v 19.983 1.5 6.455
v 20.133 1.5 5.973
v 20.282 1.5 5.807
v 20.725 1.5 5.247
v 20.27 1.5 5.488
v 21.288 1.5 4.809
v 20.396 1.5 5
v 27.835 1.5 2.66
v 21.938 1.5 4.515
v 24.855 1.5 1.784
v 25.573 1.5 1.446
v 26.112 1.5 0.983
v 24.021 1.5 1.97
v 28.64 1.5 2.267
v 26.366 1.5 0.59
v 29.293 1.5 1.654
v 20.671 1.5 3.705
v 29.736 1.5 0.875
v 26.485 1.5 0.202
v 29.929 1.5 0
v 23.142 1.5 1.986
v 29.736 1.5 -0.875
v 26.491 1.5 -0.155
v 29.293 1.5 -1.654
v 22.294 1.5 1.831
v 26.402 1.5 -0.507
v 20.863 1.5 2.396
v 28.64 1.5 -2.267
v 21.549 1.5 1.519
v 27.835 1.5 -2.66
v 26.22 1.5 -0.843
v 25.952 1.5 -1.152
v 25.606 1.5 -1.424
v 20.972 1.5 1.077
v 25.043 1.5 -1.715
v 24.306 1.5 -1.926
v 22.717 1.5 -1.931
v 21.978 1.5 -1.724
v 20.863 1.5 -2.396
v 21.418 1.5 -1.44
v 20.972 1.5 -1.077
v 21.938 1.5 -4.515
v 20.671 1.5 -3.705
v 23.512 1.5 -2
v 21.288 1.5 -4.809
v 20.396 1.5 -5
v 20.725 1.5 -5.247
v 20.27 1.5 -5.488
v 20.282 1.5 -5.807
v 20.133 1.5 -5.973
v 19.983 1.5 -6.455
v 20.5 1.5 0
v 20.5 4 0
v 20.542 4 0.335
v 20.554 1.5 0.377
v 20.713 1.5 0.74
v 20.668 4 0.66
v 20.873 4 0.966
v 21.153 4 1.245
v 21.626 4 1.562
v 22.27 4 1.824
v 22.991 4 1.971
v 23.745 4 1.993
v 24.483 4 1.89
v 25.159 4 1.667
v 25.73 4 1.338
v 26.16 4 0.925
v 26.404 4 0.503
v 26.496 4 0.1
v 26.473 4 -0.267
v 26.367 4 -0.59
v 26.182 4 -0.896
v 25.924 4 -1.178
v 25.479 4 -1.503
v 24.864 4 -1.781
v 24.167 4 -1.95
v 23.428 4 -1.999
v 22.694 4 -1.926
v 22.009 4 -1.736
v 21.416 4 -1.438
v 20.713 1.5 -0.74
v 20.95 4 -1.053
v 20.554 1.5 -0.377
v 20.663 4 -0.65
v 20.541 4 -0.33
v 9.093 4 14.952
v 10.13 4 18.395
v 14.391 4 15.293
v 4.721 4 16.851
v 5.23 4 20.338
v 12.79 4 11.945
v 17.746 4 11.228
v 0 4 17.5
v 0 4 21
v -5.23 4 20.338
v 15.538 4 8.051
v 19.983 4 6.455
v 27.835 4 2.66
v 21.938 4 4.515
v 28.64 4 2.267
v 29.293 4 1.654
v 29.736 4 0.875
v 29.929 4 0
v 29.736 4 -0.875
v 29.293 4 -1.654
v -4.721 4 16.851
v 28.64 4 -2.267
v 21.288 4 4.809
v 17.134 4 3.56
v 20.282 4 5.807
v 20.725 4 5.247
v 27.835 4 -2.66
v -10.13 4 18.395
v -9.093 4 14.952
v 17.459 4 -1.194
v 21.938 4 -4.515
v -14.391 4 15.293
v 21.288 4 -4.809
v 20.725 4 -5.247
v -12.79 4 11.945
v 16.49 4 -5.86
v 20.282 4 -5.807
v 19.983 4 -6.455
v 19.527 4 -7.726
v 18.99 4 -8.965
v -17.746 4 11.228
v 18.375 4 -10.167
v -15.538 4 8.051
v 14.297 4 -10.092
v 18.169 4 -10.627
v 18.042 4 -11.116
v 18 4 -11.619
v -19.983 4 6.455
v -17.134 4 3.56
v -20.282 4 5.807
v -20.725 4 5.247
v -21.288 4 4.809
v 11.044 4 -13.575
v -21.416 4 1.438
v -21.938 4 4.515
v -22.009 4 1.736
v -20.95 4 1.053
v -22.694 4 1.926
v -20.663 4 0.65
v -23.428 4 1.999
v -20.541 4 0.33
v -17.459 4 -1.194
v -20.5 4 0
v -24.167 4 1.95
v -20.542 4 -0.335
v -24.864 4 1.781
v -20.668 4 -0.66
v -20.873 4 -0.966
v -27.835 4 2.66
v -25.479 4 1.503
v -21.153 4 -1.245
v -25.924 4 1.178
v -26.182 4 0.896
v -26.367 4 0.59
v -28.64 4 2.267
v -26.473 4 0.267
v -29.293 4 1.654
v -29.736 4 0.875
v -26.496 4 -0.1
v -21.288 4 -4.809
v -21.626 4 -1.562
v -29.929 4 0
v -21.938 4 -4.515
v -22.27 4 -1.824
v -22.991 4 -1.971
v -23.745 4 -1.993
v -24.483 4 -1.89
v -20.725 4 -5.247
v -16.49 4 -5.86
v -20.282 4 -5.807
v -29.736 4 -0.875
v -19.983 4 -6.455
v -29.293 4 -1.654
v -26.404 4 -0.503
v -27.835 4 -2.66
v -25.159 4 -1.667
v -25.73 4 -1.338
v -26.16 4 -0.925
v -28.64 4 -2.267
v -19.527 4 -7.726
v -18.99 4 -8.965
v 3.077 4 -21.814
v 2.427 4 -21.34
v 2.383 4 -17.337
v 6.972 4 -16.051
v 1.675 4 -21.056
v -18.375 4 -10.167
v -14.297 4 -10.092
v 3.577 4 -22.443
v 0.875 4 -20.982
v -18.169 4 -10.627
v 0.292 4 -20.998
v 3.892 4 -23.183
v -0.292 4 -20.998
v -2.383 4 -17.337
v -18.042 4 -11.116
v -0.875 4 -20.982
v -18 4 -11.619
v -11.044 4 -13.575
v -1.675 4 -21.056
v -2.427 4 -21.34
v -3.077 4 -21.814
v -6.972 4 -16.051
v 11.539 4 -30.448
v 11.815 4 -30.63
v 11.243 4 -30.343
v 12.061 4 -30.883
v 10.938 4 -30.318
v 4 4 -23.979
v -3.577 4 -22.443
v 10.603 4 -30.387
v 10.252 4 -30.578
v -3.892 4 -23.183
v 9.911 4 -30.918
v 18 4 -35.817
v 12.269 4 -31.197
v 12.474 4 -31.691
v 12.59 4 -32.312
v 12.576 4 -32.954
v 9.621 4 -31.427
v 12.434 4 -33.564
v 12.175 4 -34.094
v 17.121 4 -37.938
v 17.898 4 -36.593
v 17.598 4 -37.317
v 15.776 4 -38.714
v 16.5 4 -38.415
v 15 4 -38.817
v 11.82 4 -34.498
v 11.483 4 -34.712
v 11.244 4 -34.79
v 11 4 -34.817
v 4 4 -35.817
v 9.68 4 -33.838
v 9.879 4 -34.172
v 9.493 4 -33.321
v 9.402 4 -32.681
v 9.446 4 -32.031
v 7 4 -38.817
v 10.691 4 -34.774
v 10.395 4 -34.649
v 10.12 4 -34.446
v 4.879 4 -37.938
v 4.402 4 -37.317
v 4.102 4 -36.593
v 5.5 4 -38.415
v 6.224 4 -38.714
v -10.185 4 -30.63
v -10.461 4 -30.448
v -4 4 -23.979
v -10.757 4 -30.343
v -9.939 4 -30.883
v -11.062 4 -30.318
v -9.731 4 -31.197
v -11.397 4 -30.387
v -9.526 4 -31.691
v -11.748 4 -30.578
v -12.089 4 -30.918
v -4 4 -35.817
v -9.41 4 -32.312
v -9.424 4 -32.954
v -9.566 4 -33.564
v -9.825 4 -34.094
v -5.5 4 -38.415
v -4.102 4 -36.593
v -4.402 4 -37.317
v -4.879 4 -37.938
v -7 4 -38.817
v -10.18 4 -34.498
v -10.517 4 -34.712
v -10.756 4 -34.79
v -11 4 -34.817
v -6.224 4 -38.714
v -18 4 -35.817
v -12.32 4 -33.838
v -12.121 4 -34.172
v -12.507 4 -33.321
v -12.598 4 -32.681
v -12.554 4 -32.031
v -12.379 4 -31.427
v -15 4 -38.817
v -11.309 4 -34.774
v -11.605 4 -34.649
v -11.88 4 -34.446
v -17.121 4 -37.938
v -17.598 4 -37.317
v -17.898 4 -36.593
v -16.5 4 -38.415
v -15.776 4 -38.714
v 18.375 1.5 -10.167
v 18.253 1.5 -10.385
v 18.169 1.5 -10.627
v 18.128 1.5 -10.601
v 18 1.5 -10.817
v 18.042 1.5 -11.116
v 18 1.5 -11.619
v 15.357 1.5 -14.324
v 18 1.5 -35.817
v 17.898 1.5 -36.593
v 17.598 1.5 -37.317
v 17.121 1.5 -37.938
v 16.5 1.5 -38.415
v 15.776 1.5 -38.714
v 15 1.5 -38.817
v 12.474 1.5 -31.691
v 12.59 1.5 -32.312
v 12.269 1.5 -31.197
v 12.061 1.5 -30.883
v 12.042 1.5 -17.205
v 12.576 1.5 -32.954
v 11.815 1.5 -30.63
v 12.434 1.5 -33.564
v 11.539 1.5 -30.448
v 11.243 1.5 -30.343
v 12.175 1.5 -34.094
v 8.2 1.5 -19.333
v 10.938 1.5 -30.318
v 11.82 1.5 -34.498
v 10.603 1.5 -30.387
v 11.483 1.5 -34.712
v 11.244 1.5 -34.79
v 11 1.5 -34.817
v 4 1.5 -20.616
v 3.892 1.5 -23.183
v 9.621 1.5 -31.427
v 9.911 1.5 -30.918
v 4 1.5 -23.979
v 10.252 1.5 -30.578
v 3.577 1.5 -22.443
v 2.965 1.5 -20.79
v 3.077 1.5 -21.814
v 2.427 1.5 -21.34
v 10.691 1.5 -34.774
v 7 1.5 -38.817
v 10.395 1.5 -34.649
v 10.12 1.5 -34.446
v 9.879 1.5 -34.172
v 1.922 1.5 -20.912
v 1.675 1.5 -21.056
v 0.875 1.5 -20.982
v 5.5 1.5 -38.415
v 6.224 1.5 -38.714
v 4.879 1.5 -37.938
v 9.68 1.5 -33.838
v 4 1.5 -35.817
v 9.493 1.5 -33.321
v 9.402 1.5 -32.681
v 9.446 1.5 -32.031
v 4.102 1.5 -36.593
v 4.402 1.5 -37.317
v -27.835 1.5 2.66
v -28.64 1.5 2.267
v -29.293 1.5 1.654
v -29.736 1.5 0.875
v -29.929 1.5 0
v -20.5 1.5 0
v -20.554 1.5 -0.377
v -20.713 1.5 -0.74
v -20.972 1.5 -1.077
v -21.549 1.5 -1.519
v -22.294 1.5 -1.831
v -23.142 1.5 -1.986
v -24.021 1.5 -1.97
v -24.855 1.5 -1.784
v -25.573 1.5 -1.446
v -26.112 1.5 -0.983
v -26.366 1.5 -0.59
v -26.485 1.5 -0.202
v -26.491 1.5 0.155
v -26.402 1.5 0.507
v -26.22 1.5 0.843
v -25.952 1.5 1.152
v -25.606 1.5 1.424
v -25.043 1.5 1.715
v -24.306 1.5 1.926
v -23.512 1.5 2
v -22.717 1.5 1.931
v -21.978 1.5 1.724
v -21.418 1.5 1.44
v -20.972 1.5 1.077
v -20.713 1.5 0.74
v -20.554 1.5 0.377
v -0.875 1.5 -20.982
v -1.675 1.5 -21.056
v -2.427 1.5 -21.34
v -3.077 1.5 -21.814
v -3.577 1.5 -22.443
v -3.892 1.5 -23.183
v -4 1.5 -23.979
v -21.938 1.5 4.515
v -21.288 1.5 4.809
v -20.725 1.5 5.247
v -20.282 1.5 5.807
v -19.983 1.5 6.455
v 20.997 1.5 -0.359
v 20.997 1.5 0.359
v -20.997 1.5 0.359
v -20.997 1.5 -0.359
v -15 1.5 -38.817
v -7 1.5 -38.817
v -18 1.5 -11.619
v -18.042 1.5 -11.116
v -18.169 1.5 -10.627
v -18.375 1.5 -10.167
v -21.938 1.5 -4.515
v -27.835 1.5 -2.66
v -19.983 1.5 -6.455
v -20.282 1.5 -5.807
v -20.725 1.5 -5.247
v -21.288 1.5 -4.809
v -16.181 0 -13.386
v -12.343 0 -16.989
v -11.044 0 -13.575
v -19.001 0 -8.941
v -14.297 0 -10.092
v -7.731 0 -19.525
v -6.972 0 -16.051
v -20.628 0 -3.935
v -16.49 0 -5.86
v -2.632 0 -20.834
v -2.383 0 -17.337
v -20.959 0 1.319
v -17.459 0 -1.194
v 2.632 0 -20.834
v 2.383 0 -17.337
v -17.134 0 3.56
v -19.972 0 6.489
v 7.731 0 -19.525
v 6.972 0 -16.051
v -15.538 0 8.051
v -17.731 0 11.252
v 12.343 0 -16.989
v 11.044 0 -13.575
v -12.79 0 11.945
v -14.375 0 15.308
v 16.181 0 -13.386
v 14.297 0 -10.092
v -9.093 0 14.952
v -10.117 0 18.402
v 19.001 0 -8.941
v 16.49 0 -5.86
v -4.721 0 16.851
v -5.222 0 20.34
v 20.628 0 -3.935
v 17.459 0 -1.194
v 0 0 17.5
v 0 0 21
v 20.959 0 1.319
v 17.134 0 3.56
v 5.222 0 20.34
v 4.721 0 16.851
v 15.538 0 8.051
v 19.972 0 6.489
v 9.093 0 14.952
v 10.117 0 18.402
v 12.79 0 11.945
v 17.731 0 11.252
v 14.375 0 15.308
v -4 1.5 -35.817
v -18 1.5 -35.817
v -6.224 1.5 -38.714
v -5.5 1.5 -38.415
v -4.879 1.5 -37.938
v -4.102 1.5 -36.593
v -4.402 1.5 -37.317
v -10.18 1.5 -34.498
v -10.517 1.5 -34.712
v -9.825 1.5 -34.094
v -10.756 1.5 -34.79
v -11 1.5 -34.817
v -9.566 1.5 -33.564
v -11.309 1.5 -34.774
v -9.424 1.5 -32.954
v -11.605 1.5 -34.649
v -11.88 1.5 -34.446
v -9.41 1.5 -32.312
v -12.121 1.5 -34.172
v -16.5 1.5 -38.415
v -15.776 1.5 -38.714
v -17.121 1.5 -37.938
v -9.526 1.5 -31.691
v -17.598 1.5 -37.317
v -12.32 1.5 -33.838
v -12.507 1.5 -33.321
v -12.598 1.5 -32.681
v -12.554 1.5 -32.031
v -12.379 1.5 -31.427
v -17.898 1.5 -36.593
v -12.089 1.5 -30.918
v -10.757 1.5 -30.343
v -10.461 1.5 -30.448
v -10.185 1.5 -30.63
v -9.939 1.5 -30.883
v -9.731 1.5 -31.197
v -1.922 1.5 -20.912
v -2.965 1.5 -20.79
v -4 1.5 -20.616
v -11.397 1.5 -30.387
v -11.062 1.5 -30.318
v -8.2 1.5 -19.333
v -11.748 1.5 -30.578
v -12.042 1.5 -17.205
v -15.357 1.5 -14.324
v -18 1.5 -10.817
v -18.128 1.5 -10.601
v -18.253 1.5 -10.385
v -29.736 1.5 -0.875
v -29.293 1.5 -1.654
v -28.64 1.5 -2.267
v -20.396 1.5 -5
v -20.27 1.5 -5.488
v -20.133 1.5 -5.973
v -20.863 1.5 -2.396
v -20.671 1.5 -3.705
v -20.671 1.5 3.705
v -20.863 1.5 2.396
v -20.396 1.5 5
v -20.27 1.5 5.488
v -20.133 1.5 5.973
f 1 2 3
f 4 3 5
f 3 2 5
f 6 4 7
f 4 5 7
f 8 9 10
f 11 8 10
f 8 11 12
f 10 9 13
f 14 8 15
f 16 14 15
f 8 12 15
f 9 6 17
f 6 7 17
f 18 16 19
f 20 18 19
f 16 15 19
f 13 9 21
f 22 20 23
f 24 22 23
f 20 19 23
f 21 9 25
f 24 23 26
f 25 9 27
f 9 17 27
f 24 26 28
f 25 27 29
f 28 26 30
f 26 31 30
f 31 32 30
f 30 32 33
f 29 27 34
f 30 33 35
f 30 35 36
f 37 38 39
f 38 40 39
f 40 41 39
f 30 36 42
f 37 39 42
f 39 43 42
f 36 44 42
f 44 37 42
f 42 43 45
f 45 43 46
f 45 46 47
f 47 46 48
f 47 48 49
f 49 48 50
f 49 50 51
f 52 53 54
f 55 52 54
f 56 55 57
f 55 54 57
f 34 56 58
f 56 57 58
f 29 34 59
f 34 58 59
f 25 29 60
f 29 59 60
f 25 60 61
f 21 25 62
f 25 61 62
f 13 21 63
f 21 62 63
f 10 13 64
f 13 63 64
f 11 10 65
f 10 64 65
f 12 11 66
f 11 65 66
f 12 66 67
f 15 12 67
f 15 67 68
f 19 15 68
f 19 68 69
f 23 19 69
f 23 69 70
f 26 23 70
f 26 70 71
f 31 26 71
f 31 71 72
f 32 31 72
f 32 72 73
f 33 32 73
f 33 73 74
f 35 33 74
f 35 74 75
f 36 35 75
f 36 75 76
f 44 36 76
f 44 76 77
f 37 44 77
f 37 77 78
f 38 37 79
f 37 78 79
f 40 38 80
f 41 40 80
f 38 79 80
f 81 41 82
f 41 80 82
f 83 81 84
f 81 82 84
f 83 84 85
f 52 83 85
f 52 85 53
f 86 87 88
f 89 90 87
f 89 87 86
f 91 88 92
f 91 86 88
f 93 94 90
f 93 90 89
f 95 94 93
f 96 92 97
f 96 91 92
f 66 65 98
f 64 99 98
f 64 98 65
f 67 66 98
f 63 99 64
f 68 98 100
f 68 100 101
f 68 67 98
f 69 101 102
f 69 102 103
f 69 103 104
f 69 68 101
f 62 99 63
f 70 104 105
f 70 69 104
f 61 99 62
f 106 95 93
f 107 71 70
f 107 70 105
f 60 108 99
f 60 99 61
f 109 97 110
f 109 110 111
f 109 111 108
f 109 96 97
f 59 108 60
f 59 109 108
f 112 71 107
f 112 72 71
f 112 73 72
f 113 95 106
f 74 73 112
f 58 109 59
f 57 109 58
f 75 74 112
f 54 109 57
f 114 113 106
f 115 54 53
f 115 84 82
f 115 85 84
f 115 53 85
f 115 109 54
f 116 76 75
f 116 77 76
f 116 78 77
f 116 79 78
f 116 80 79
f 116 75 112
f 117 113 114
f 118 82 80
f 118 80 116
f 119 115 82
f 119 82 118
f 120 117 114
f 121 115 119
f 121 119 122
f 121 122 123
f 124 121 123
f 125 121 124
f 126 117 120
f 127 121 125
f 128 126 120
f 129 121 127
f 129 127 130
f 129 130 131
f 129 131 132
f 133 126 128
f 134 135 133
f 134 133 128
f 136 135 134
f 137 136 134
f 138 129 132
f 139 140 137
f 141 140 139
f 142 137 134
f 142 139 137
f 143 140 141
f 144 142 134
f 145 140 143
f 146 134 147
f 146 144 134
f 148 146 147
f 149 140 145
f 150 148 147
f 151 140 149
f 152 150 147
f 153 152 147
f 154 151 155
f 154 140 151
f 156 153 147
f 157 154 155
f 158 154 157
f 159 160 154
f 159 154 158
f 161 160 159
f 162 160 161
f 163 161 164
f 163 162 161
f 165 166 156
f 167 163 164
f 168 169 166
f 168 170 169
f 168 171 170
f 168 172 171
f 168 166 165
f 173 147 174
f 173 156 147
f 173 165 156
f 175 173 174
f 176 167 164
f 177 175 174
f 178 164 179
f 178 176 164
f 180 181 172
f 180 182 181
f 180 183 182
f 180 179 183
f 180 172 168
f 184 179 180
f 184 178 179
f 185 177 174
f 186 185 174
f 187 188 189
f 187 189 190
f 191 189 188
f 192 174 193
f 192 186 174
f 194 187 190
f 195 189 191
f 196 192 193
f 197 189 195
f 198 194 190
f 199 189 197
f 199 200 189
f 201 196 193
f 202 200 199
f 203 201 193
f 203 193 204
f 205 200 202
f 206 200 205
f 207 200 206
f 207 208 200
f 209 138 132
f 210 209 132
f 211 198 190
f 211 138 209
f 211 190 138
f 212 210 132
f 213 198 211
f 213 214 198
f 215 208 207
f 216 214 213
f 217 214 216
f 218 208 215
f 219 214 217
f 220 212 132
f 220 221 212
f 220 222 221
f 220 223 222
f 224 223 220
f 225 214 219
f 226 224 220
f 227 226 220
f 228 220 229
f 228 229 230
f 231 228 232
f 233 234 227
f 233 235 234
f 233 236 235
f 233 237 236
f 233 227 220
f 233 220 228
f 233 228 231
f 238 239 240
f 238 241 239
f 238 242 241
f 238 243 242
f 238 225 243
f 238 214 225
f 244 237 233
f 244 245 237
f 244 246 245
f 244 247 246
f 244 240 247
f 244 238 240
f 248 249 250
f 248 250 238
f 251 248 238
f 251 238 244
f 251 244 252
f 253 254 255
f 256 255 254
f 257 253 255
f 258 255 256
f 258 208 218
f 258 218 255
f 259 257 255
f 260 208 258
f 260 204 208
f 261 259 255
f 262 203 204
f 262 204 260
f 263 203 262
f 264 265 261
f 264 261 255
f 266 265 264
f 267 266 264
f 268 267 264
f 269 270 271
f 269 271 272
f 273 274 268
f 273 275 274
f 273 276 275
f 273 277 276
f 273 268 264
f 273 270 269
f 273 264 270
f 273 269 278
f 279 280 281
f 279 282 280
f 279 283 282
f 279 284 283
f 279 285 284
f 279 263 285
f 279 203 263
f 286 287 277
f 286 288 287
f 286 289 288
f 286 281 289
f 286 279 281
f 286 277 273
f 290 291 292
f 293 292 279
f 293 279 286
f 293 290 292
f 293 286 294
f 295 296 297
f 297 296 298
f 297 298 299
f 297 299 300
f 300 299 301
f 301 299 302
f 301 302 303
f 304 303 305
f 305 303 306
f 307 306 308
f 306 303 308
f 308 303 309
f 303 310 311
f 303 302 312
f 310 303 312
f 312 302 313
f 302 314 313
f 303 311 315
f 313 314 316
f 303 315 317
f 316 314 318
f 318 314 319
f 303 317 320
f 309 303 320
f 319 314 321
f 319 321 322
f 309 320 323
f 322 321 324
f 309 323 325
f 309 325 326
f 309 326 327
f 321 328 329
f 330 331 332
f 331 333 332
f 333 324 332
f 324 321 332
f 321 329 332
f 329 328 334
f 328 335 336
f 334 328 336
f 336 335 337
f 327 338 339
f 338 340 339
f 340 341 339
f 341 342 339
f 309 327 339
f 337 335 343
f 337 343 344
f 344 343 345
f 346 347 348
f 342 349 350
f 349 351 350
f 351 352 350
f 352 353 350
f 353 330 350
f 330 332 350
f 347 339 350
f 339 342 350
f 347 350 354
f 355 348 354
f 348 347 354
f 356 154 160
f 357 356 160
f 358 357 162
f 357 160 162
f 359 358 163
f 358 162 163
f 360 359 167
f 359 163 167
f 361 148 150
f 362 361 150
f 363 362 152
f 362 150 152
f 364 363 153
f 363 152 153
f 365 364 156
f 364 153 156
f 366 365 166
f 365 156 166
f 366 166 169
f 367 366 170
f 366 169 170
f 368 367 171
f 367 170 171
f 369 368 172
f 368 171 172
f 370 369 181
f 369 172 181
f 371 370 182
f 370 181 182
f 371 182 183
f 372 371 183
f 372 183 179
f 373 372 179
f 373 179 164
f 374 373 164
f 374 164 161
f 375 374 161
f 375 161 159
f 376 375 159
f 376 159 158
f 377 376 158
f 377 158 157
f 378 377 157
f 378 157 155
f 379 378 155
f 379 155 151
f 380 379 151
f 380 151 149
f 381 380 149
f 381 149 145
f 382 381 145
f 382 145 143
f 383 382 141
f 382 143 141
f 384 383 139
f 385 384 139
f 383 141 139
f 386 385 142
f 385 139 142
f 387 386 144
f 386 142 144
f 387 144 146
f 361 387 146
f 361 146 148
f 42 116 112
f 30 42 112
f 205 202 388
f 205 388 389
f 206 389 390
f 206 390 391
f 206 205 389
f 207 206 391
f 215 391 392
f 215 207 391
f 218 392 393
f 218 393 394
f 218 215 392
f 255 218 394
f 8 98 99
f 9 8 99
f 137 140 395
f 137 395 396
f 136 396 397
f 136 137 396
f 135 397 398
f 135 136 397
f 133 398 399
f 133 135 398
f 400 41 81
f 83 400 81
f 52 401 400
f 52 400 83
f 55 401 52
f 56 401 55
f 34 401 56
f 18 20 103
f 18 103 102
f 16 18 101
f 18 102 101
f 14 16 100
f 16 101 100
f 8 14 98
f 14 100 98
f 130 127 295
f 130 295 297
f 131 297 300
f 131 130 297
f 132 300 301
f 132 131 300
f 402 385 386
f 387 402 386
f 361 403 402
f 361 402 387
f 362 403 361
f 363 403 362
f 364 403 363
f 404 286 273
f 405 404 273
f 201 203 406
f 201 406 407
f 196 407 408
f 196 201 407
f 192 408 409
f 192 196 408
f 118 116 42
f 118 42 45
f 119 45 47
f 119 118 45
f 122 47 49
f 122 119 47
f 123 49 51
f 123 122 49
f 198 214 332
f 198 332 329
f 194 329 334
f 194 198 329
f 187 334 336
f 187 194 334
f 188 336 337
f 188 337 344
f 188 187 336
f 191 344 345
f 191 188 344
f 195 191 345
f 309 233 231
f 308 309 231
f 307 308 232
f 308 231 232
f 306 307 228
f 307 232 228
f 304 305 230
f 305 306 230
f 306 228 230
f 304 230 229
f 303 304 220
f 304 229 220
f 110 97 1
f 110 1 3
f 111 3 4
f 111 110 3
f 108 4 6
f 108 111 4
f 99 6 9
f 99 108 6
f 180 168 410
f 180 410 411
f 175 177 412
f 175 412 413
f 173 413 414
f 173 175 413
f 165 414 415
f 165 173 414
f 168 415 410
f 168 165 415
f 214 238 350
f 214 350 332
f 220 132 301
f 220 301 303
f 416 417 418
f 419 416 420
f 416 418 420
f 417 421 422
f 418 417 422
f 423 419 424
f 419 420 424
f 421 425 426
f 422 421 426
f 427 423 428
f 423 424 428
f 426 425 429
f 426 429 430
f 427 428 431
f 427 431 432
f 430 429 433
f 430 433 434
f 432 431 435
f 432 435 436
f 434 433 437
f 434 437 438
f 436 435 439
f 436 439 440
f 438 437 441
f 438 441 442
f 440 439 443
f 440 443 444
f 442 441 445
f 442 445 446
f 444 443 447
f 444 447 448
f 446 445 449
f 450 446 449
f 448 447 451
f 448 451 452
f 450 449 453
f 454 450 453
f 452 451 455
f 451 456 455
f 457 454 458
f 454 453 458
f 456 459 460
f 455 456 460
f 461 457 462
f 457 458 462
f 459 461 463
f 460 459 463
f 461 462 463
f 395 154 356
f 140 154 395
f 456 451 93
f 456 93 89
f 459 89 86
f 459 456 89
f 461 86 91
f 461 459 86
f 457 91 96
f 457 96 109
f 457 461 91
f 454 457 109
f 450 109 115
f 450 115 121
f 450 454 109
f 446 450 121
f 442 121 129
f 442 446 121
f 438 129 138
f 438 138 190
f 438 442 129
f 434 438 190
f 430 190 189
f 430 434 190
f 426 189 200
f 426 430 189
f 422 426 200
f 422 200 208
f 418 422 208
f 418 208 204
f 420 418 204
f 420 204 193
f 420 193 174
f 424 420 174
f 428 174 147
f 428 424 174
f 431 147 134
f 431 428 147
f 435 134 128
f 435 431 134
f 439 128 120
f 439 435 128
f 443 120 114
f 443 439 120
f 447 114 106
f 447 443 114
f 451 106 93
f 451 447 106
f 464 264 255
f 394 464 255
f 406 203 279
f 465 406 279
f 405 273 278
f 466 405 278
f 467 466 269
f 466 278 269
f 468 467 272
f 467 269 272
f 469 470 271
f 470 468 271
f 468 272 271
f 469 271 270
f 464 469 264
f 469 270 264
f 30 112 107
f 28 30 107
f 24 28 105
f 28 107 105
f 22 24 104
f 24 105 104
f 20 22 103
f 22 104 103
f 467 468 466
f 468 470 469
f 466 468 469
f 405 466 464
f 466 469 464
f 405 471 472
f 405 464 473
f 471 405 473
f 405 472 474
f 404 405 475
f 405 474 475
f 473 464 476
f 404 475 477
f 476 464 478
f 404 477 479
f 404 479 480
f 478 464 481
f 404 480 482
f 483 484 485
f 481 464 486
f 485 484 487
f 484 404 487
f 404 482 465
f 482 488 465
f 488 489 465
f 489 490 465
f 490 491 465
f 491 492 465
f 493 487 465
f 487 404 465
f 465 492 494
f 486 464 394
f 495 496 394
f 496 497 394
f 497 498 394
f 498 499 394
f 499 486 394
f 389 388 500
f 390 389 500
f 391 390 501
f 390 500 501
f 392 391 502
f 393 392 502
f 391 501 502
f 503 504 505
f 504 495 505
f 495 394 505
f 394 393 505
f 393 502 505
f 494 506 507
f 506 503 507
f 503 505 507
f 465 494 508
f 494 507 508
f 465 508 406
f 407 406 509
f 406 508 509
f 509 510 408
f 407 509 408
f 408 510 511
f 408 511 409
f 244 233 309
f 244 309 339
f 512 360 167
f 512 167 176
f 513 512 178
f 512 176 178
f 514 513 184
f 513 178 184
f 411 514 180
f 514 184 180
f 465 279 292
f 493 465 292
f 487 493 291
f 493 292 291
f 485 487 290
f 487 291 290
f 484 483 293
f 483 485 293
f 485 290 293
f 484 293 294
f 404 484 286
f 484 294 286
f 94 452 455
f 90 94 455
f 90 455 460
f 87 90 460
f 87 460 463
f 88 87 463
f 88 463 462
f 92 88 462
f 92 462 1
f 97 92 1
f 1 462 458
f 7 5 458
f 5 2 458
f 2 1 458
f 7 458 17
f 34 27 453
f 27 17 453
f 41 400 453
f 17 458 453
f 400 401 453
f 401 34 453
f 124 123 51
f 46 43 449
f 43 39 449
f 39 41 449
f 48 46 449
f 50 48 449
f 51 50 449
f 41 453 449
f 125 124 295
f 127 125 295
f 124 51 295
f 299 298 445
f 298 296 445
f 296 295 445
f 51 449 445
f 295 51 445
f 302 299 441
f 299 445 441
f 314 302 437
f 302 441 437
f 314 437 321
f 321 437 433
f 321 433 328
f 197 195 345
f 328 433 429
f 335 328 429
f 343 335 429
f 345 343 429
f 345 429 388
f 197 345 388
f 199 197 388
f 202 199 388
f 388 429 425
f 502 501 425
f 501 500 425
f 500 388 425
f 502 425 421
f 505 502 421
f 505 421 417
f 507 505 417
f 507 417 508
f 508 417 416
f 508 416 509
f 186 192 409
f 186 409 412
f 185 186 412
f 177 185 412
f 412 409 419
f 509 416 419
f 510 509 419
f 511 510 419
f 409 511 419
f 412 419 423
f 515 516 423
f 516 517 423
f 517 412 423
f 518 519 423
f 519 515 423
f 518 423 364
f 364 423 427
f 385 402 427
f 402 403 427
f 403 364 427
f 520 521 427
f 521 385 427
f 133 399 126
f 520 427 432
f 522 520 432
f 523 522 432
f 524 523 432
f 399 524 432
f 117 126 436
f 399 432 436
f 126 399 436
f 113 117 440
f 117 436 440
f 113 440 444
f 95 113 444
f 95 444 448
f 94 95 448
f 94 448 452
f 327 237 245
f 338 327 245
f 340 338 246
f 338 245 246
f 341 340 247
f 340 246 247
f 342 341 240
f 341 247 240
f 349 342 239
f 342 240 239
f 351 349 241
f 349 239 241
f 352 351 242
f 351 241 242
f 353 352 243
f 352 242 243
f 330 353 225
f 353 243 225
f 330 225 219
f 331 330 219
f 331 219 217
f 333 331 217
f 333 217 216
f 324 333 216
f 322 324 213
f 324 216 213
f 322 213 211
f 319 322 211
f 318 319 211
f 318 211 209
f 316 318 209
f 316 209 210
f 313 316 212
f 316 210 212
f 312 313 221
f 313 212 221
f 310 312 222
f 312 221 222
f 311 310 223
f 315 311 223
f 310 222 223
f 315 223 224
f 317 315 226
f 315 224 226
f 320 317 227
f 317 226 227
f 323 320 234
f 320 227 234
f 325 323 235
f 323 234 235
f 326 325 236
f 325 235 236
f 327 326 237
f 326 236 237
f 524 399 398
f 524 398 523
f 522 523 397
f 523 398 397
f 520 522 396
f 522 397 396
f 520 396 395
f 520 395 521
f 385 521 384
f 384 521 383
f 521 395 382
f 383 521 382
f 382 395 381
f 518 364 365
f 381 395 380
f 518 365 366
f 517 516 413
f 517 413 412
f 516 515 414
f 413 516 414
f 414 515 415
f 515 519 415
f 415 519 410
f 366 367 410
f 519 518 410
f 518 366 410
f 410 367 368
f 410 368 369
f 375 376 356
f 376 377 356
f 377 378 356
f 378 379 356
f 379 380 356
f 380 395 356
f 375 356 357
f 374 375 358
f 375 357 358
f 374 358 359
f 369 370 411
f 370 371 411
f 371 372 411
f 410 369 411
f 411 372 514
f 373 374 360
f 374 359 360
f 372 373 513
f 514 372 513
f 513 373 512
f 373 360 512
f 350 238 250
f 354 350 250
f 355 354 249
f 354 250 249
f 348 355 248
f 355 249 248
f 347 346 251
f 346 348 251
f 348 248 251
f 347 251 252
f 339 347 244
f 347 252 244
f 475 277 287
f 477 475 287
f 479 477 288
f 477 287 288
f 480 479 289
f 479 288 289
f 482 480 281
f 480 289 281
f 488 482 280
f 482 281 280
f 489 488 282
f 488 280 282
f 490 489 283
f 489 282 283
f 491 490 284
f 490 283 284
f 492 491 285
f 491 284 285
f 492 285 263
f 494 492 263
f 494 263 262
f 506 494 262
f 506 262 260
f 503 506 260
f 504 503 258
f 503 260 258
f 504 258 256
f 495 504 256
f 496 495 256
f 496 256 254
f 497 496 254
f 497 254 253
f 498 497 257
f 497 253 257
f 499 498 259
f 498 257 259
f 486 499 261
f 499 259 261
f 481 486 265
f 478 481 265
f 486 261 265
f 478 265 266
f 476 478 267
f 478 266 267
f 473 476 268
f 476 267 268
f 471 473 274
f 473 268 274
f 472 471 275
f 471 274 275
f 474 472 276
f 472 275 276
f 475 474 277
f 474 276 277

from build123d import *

# Parameters (mm, degrees)
SKETCH1_R           = 21
SKETCH1_R_2         = 17.5
BOSS_EXTRUDE1_DEPTH = 4
BOSS_EXTRUDE2_DEPTH = 2.5
SKETCH3_RX          = 2.25
SKETCH3_RY          = 1.6
SKETCH3_RX_2        = 3
SKETCH3_RY_2        = 2
CUT_EXTRUDE1_DEPTH  = 2.5
FILLET1_R           = 3


with BuildPart() as part:
    # Sketch1 → Boss-Extrude1 (new body)
    with BuildSketch(Plane(origin=(0, 0, 0), x_dir=(1, 0, 0), z_dir=(0, 1, 0))):
        with Locations(Location((0, 0, 0), (0, 0, 270))):
            Circle(SKETCH1_R)
        with Locations(Location((0, 0, 0), (0, 0, 270))):
            Circle(SKETCH1_R_2, mode=Mode.SUBTRACT)
    extrude(amount=BOSS_EXTRUDE1_DEPTH)

    # Sketch2 → Boss-Extrude2 (add)
    with BuildSketch(Plane(origin=(0, 4, 0), x_dir=(1, 0, 0), z_dir=(0, 1, 0))):
        Polygon((-20.396078054, 5), (-29.935470069, 2), (-29.935470069, -2), (-20.396078054, -5), align=None)
        Polygon((20.396078054, -5), (20.396078054, 5), (29.935470069, 2), (29.935470069, -2), align=None)
        Polygon((-18, 10.816653826), (-18, 38.816653826), (-4, 38.816653826), (-4, 20.615528128), align=None)
        Polygon((4, 20.615528128), (18, 10.816653826), (18, 38.816653826), (4, 38.816653826), align=None)
    extrude(amount=-BOSS_EXTRUDE2_DEPTH)

    # Sketch3 → Cut-Extrude1 (cut)
    with BuildSketch(Plane(origin=(0, 4, 0), x_dir=(1, 0, 0), z_dir=(0, 1, 0))):
        with Locations(Location((-11, 32.566653826), (0, 0, 90))):
            Ellipse(SKETCH3_RX, SKETCH3_RY)
        with Locations(Location((11, 32.566653826), (0, 0, 90))):
            Ellipse(SKETCH3_RX, SKETCH3_RY)
        with Locations((-23.5, 0)):
            Ellipse(SKETCH3_RX_2, SKETCH3_RY_2)
        with Locations(Location((23.5, 0), (0, 0, 180))):
            Ellipse(SKETCH3_RX_2, SKETCH3_RY_2)
    extrude(amount=-CUT_EXTRUDE1_DEPTH, mode=Mode.SUBTRACT)

    # Fillet1
    # the kernel refuses this fillet: 3 mm, written as the material it adds along each edge
    with BuildSketch(Plane(origin=(-18, 4, -10.816653826), x_dir=(-0.4996806126682358, 0, 0.8662097236371205), z_dir=(0, -1, 0))) as fillet1_piece_1:
        with BuildLine():
            CenterArc((0.804085058, 2.999521034), FILLET1_R, 240.021128247, 28.955024372)
            Line((-0.69495678, 0.400891863), (0, 0))
            ThreePointArc((0, 0), (0.375239694, 0.003352764), (0.750479387, 0))
        make_face()
    extrude(amount=2.5)
    with BuildSketch(Plane(origin=(-4, 4, -20.615528128), x_dir=(0.9932025912341629, 0, -0.11639850843436236), z_dir=(0, -1, 0))) as fillet1_piece_2:
        with BuildLine():
            CenterArc((3.371129229, -2.991569999), FILLET1_R, 94.296279982, 92.388015463)
            Line((0.391521455, -3.340765524), (0, 0))
            ThreePointArc((0, 0), (1.57319364, -0.05901001), (3.14638728, 0))
        make_face()
    extrude(amount=2.5)
    with BuildSketch(Plane(origin=(4, 4, -20.615528128), x_dir=(-0.9932025912341629, 0, -0.11639850843436243), z_dir=(0, -1, 0))) as fillet1_piece_3:
        with BuildLine():
            CenterArc((3.371129229, 2.991569999), FILLET1_R, 173.315704555, 92.388015463)
            Line((0.391521455, 3.340765524), (0, 0))
            ThreePointArc((0, 0), (1.57319364, 0.05901001), (3.14638728, 0))
        make_face()
    extrude(amount=2.5)
    with BuildSketch(Plane(origin=(18, 4, -10.816653826), x_dir=(0.4996806126682291, 0, 0.8662097236371242), z_dir=(0, -1, 0))) as fillet1_piece_4:
        with BuildLine():
            CenterArc((0.804085058, -2.999521034), FILLET1_R, 91.023847381, 28.955024372)
            Line((-0.69495678, -0.400891863), (0, 0))
            ThreePointArc((0, 0), (0.375239694, -0.003352764), (0.750479387, 0))
        make_face()
    extrude(amount=2.5)
    with BuildSketch(Plane(origin=(20.396078054, 4, -5), x_dir=(-0.2729089679529711, 0, -0.9620398615498447), z_dir=(0, -1, 0)), Plane(origin=(-20.396078054, 4, 5), x_dir=(0.2729089679529655, 0, 0.9620398615498462), z_dir=(0, -1, 0))) as fillet1_piece_5:
        with BuildLine():
            CenterArc((1.620157081, 2.998054992), FILLET1_R, 213.295044107, 54.641661907)
            Line((-0.88740746, 1.351203428), (0, 0))
            ThreePointArc((0, 0), (0.756073304, 0.013615053), (1.512146609, 0))
        make_face()
    extrude(amount=2.5)
    with BuildSketch(Plane(origin=(20.396078054, 4, 5), x_dir=(-0.2729089679529669, 0, 0.9620398615498458), z_dir=(0, -1, 0)), Plane(origin=(-20.396078054, 4, -5), x_dir=(0.27290896795296393, 0, -0.9620398615498467), z_dir=(0, -1, 0))) as fillet1_piece_6:
        with BuildLine():
            CenterArc((1.620157081, -2.998054992), FILLET1_R, 92.063293986, 54.641661907)
            Line((-0.88740746, -1.351203428), (0, 0))
            ThreePointArc((0, 0), (0.756073304, -0.013615053), (1.512146609, 0))
        make_face()
    extrude(amount=2.5)
    # the kernel refuses this fillet: 3 mm, written as the material it takes off along each edge
    with BuildSketch(Plane(origin=(-18, 11.5, -38.816653826), x_dir=(0, 0, 1), z_dir=(0, -1, 0)), Plane(origin=(-4, 11.5, -38.816653826), x_dir=(-1, 0, 0), z_dir=(0, -1, 0)), Plane(origin=(4, 11.5, -38.816653826), x_dir=(0, 0, 1), z_dir=(0, -1, 0)), Plane(origin=(18, 11.5, -38.816653826), x_dir=(-1, 0, 0), z_dir=(0, -1, 0))) as fillet1_2_piece_1:
        with BuildLine():
            CenterArc((FILLET1_R, -FILLET1_R), FILLET1_R, 90, 90)
            Line((0, -FILLET1_R), (0, 0))
            Line((0, 0), (FILLET1_R, 0))
        make_face()
    extrude(amount=17.5, mode=Mode.SUBTRACT)
    with BuildSketch(Plane(origin=(29.935470069, 9.503495393, -2), x_dir=(-0.9539392014169457, 0, -0.30000000000000027), z_dir=(0, -1, 0)), Plane(origin=(29.935470069, 9.503495393, 2), x_dir=(0, 0, -1), z_dir=(0, -1, 0)), Plane(origin=(-29.935470069, 9.503495393, 2), x_dir=(0.9539392014169454, 0, 0.3000000000000004), z_dir=(0, -1, 0)), Plane(origin=(-29.935470069, 9.503495393, -2), x_dir=(0, 0, 1), z_dir=(0, -1, 0))) as fillet1_2_piece_2:
        with BuildLine():
            CenterArc((FILLET1_R * 0.733799385705, -FILLET1_R), FILLET1_R, 90, 72.542396876)
            Line((-FILLET1_R * 0.220139815712, -FILLET1_R * 0.7), (0, 0))
            Line((0, 0), (FILLET1_R * 0.733799385705, 0))
        make_face()
    extrude(amount=13.506990786, mode=Mode.SUBTRACT)


solid = part.part
